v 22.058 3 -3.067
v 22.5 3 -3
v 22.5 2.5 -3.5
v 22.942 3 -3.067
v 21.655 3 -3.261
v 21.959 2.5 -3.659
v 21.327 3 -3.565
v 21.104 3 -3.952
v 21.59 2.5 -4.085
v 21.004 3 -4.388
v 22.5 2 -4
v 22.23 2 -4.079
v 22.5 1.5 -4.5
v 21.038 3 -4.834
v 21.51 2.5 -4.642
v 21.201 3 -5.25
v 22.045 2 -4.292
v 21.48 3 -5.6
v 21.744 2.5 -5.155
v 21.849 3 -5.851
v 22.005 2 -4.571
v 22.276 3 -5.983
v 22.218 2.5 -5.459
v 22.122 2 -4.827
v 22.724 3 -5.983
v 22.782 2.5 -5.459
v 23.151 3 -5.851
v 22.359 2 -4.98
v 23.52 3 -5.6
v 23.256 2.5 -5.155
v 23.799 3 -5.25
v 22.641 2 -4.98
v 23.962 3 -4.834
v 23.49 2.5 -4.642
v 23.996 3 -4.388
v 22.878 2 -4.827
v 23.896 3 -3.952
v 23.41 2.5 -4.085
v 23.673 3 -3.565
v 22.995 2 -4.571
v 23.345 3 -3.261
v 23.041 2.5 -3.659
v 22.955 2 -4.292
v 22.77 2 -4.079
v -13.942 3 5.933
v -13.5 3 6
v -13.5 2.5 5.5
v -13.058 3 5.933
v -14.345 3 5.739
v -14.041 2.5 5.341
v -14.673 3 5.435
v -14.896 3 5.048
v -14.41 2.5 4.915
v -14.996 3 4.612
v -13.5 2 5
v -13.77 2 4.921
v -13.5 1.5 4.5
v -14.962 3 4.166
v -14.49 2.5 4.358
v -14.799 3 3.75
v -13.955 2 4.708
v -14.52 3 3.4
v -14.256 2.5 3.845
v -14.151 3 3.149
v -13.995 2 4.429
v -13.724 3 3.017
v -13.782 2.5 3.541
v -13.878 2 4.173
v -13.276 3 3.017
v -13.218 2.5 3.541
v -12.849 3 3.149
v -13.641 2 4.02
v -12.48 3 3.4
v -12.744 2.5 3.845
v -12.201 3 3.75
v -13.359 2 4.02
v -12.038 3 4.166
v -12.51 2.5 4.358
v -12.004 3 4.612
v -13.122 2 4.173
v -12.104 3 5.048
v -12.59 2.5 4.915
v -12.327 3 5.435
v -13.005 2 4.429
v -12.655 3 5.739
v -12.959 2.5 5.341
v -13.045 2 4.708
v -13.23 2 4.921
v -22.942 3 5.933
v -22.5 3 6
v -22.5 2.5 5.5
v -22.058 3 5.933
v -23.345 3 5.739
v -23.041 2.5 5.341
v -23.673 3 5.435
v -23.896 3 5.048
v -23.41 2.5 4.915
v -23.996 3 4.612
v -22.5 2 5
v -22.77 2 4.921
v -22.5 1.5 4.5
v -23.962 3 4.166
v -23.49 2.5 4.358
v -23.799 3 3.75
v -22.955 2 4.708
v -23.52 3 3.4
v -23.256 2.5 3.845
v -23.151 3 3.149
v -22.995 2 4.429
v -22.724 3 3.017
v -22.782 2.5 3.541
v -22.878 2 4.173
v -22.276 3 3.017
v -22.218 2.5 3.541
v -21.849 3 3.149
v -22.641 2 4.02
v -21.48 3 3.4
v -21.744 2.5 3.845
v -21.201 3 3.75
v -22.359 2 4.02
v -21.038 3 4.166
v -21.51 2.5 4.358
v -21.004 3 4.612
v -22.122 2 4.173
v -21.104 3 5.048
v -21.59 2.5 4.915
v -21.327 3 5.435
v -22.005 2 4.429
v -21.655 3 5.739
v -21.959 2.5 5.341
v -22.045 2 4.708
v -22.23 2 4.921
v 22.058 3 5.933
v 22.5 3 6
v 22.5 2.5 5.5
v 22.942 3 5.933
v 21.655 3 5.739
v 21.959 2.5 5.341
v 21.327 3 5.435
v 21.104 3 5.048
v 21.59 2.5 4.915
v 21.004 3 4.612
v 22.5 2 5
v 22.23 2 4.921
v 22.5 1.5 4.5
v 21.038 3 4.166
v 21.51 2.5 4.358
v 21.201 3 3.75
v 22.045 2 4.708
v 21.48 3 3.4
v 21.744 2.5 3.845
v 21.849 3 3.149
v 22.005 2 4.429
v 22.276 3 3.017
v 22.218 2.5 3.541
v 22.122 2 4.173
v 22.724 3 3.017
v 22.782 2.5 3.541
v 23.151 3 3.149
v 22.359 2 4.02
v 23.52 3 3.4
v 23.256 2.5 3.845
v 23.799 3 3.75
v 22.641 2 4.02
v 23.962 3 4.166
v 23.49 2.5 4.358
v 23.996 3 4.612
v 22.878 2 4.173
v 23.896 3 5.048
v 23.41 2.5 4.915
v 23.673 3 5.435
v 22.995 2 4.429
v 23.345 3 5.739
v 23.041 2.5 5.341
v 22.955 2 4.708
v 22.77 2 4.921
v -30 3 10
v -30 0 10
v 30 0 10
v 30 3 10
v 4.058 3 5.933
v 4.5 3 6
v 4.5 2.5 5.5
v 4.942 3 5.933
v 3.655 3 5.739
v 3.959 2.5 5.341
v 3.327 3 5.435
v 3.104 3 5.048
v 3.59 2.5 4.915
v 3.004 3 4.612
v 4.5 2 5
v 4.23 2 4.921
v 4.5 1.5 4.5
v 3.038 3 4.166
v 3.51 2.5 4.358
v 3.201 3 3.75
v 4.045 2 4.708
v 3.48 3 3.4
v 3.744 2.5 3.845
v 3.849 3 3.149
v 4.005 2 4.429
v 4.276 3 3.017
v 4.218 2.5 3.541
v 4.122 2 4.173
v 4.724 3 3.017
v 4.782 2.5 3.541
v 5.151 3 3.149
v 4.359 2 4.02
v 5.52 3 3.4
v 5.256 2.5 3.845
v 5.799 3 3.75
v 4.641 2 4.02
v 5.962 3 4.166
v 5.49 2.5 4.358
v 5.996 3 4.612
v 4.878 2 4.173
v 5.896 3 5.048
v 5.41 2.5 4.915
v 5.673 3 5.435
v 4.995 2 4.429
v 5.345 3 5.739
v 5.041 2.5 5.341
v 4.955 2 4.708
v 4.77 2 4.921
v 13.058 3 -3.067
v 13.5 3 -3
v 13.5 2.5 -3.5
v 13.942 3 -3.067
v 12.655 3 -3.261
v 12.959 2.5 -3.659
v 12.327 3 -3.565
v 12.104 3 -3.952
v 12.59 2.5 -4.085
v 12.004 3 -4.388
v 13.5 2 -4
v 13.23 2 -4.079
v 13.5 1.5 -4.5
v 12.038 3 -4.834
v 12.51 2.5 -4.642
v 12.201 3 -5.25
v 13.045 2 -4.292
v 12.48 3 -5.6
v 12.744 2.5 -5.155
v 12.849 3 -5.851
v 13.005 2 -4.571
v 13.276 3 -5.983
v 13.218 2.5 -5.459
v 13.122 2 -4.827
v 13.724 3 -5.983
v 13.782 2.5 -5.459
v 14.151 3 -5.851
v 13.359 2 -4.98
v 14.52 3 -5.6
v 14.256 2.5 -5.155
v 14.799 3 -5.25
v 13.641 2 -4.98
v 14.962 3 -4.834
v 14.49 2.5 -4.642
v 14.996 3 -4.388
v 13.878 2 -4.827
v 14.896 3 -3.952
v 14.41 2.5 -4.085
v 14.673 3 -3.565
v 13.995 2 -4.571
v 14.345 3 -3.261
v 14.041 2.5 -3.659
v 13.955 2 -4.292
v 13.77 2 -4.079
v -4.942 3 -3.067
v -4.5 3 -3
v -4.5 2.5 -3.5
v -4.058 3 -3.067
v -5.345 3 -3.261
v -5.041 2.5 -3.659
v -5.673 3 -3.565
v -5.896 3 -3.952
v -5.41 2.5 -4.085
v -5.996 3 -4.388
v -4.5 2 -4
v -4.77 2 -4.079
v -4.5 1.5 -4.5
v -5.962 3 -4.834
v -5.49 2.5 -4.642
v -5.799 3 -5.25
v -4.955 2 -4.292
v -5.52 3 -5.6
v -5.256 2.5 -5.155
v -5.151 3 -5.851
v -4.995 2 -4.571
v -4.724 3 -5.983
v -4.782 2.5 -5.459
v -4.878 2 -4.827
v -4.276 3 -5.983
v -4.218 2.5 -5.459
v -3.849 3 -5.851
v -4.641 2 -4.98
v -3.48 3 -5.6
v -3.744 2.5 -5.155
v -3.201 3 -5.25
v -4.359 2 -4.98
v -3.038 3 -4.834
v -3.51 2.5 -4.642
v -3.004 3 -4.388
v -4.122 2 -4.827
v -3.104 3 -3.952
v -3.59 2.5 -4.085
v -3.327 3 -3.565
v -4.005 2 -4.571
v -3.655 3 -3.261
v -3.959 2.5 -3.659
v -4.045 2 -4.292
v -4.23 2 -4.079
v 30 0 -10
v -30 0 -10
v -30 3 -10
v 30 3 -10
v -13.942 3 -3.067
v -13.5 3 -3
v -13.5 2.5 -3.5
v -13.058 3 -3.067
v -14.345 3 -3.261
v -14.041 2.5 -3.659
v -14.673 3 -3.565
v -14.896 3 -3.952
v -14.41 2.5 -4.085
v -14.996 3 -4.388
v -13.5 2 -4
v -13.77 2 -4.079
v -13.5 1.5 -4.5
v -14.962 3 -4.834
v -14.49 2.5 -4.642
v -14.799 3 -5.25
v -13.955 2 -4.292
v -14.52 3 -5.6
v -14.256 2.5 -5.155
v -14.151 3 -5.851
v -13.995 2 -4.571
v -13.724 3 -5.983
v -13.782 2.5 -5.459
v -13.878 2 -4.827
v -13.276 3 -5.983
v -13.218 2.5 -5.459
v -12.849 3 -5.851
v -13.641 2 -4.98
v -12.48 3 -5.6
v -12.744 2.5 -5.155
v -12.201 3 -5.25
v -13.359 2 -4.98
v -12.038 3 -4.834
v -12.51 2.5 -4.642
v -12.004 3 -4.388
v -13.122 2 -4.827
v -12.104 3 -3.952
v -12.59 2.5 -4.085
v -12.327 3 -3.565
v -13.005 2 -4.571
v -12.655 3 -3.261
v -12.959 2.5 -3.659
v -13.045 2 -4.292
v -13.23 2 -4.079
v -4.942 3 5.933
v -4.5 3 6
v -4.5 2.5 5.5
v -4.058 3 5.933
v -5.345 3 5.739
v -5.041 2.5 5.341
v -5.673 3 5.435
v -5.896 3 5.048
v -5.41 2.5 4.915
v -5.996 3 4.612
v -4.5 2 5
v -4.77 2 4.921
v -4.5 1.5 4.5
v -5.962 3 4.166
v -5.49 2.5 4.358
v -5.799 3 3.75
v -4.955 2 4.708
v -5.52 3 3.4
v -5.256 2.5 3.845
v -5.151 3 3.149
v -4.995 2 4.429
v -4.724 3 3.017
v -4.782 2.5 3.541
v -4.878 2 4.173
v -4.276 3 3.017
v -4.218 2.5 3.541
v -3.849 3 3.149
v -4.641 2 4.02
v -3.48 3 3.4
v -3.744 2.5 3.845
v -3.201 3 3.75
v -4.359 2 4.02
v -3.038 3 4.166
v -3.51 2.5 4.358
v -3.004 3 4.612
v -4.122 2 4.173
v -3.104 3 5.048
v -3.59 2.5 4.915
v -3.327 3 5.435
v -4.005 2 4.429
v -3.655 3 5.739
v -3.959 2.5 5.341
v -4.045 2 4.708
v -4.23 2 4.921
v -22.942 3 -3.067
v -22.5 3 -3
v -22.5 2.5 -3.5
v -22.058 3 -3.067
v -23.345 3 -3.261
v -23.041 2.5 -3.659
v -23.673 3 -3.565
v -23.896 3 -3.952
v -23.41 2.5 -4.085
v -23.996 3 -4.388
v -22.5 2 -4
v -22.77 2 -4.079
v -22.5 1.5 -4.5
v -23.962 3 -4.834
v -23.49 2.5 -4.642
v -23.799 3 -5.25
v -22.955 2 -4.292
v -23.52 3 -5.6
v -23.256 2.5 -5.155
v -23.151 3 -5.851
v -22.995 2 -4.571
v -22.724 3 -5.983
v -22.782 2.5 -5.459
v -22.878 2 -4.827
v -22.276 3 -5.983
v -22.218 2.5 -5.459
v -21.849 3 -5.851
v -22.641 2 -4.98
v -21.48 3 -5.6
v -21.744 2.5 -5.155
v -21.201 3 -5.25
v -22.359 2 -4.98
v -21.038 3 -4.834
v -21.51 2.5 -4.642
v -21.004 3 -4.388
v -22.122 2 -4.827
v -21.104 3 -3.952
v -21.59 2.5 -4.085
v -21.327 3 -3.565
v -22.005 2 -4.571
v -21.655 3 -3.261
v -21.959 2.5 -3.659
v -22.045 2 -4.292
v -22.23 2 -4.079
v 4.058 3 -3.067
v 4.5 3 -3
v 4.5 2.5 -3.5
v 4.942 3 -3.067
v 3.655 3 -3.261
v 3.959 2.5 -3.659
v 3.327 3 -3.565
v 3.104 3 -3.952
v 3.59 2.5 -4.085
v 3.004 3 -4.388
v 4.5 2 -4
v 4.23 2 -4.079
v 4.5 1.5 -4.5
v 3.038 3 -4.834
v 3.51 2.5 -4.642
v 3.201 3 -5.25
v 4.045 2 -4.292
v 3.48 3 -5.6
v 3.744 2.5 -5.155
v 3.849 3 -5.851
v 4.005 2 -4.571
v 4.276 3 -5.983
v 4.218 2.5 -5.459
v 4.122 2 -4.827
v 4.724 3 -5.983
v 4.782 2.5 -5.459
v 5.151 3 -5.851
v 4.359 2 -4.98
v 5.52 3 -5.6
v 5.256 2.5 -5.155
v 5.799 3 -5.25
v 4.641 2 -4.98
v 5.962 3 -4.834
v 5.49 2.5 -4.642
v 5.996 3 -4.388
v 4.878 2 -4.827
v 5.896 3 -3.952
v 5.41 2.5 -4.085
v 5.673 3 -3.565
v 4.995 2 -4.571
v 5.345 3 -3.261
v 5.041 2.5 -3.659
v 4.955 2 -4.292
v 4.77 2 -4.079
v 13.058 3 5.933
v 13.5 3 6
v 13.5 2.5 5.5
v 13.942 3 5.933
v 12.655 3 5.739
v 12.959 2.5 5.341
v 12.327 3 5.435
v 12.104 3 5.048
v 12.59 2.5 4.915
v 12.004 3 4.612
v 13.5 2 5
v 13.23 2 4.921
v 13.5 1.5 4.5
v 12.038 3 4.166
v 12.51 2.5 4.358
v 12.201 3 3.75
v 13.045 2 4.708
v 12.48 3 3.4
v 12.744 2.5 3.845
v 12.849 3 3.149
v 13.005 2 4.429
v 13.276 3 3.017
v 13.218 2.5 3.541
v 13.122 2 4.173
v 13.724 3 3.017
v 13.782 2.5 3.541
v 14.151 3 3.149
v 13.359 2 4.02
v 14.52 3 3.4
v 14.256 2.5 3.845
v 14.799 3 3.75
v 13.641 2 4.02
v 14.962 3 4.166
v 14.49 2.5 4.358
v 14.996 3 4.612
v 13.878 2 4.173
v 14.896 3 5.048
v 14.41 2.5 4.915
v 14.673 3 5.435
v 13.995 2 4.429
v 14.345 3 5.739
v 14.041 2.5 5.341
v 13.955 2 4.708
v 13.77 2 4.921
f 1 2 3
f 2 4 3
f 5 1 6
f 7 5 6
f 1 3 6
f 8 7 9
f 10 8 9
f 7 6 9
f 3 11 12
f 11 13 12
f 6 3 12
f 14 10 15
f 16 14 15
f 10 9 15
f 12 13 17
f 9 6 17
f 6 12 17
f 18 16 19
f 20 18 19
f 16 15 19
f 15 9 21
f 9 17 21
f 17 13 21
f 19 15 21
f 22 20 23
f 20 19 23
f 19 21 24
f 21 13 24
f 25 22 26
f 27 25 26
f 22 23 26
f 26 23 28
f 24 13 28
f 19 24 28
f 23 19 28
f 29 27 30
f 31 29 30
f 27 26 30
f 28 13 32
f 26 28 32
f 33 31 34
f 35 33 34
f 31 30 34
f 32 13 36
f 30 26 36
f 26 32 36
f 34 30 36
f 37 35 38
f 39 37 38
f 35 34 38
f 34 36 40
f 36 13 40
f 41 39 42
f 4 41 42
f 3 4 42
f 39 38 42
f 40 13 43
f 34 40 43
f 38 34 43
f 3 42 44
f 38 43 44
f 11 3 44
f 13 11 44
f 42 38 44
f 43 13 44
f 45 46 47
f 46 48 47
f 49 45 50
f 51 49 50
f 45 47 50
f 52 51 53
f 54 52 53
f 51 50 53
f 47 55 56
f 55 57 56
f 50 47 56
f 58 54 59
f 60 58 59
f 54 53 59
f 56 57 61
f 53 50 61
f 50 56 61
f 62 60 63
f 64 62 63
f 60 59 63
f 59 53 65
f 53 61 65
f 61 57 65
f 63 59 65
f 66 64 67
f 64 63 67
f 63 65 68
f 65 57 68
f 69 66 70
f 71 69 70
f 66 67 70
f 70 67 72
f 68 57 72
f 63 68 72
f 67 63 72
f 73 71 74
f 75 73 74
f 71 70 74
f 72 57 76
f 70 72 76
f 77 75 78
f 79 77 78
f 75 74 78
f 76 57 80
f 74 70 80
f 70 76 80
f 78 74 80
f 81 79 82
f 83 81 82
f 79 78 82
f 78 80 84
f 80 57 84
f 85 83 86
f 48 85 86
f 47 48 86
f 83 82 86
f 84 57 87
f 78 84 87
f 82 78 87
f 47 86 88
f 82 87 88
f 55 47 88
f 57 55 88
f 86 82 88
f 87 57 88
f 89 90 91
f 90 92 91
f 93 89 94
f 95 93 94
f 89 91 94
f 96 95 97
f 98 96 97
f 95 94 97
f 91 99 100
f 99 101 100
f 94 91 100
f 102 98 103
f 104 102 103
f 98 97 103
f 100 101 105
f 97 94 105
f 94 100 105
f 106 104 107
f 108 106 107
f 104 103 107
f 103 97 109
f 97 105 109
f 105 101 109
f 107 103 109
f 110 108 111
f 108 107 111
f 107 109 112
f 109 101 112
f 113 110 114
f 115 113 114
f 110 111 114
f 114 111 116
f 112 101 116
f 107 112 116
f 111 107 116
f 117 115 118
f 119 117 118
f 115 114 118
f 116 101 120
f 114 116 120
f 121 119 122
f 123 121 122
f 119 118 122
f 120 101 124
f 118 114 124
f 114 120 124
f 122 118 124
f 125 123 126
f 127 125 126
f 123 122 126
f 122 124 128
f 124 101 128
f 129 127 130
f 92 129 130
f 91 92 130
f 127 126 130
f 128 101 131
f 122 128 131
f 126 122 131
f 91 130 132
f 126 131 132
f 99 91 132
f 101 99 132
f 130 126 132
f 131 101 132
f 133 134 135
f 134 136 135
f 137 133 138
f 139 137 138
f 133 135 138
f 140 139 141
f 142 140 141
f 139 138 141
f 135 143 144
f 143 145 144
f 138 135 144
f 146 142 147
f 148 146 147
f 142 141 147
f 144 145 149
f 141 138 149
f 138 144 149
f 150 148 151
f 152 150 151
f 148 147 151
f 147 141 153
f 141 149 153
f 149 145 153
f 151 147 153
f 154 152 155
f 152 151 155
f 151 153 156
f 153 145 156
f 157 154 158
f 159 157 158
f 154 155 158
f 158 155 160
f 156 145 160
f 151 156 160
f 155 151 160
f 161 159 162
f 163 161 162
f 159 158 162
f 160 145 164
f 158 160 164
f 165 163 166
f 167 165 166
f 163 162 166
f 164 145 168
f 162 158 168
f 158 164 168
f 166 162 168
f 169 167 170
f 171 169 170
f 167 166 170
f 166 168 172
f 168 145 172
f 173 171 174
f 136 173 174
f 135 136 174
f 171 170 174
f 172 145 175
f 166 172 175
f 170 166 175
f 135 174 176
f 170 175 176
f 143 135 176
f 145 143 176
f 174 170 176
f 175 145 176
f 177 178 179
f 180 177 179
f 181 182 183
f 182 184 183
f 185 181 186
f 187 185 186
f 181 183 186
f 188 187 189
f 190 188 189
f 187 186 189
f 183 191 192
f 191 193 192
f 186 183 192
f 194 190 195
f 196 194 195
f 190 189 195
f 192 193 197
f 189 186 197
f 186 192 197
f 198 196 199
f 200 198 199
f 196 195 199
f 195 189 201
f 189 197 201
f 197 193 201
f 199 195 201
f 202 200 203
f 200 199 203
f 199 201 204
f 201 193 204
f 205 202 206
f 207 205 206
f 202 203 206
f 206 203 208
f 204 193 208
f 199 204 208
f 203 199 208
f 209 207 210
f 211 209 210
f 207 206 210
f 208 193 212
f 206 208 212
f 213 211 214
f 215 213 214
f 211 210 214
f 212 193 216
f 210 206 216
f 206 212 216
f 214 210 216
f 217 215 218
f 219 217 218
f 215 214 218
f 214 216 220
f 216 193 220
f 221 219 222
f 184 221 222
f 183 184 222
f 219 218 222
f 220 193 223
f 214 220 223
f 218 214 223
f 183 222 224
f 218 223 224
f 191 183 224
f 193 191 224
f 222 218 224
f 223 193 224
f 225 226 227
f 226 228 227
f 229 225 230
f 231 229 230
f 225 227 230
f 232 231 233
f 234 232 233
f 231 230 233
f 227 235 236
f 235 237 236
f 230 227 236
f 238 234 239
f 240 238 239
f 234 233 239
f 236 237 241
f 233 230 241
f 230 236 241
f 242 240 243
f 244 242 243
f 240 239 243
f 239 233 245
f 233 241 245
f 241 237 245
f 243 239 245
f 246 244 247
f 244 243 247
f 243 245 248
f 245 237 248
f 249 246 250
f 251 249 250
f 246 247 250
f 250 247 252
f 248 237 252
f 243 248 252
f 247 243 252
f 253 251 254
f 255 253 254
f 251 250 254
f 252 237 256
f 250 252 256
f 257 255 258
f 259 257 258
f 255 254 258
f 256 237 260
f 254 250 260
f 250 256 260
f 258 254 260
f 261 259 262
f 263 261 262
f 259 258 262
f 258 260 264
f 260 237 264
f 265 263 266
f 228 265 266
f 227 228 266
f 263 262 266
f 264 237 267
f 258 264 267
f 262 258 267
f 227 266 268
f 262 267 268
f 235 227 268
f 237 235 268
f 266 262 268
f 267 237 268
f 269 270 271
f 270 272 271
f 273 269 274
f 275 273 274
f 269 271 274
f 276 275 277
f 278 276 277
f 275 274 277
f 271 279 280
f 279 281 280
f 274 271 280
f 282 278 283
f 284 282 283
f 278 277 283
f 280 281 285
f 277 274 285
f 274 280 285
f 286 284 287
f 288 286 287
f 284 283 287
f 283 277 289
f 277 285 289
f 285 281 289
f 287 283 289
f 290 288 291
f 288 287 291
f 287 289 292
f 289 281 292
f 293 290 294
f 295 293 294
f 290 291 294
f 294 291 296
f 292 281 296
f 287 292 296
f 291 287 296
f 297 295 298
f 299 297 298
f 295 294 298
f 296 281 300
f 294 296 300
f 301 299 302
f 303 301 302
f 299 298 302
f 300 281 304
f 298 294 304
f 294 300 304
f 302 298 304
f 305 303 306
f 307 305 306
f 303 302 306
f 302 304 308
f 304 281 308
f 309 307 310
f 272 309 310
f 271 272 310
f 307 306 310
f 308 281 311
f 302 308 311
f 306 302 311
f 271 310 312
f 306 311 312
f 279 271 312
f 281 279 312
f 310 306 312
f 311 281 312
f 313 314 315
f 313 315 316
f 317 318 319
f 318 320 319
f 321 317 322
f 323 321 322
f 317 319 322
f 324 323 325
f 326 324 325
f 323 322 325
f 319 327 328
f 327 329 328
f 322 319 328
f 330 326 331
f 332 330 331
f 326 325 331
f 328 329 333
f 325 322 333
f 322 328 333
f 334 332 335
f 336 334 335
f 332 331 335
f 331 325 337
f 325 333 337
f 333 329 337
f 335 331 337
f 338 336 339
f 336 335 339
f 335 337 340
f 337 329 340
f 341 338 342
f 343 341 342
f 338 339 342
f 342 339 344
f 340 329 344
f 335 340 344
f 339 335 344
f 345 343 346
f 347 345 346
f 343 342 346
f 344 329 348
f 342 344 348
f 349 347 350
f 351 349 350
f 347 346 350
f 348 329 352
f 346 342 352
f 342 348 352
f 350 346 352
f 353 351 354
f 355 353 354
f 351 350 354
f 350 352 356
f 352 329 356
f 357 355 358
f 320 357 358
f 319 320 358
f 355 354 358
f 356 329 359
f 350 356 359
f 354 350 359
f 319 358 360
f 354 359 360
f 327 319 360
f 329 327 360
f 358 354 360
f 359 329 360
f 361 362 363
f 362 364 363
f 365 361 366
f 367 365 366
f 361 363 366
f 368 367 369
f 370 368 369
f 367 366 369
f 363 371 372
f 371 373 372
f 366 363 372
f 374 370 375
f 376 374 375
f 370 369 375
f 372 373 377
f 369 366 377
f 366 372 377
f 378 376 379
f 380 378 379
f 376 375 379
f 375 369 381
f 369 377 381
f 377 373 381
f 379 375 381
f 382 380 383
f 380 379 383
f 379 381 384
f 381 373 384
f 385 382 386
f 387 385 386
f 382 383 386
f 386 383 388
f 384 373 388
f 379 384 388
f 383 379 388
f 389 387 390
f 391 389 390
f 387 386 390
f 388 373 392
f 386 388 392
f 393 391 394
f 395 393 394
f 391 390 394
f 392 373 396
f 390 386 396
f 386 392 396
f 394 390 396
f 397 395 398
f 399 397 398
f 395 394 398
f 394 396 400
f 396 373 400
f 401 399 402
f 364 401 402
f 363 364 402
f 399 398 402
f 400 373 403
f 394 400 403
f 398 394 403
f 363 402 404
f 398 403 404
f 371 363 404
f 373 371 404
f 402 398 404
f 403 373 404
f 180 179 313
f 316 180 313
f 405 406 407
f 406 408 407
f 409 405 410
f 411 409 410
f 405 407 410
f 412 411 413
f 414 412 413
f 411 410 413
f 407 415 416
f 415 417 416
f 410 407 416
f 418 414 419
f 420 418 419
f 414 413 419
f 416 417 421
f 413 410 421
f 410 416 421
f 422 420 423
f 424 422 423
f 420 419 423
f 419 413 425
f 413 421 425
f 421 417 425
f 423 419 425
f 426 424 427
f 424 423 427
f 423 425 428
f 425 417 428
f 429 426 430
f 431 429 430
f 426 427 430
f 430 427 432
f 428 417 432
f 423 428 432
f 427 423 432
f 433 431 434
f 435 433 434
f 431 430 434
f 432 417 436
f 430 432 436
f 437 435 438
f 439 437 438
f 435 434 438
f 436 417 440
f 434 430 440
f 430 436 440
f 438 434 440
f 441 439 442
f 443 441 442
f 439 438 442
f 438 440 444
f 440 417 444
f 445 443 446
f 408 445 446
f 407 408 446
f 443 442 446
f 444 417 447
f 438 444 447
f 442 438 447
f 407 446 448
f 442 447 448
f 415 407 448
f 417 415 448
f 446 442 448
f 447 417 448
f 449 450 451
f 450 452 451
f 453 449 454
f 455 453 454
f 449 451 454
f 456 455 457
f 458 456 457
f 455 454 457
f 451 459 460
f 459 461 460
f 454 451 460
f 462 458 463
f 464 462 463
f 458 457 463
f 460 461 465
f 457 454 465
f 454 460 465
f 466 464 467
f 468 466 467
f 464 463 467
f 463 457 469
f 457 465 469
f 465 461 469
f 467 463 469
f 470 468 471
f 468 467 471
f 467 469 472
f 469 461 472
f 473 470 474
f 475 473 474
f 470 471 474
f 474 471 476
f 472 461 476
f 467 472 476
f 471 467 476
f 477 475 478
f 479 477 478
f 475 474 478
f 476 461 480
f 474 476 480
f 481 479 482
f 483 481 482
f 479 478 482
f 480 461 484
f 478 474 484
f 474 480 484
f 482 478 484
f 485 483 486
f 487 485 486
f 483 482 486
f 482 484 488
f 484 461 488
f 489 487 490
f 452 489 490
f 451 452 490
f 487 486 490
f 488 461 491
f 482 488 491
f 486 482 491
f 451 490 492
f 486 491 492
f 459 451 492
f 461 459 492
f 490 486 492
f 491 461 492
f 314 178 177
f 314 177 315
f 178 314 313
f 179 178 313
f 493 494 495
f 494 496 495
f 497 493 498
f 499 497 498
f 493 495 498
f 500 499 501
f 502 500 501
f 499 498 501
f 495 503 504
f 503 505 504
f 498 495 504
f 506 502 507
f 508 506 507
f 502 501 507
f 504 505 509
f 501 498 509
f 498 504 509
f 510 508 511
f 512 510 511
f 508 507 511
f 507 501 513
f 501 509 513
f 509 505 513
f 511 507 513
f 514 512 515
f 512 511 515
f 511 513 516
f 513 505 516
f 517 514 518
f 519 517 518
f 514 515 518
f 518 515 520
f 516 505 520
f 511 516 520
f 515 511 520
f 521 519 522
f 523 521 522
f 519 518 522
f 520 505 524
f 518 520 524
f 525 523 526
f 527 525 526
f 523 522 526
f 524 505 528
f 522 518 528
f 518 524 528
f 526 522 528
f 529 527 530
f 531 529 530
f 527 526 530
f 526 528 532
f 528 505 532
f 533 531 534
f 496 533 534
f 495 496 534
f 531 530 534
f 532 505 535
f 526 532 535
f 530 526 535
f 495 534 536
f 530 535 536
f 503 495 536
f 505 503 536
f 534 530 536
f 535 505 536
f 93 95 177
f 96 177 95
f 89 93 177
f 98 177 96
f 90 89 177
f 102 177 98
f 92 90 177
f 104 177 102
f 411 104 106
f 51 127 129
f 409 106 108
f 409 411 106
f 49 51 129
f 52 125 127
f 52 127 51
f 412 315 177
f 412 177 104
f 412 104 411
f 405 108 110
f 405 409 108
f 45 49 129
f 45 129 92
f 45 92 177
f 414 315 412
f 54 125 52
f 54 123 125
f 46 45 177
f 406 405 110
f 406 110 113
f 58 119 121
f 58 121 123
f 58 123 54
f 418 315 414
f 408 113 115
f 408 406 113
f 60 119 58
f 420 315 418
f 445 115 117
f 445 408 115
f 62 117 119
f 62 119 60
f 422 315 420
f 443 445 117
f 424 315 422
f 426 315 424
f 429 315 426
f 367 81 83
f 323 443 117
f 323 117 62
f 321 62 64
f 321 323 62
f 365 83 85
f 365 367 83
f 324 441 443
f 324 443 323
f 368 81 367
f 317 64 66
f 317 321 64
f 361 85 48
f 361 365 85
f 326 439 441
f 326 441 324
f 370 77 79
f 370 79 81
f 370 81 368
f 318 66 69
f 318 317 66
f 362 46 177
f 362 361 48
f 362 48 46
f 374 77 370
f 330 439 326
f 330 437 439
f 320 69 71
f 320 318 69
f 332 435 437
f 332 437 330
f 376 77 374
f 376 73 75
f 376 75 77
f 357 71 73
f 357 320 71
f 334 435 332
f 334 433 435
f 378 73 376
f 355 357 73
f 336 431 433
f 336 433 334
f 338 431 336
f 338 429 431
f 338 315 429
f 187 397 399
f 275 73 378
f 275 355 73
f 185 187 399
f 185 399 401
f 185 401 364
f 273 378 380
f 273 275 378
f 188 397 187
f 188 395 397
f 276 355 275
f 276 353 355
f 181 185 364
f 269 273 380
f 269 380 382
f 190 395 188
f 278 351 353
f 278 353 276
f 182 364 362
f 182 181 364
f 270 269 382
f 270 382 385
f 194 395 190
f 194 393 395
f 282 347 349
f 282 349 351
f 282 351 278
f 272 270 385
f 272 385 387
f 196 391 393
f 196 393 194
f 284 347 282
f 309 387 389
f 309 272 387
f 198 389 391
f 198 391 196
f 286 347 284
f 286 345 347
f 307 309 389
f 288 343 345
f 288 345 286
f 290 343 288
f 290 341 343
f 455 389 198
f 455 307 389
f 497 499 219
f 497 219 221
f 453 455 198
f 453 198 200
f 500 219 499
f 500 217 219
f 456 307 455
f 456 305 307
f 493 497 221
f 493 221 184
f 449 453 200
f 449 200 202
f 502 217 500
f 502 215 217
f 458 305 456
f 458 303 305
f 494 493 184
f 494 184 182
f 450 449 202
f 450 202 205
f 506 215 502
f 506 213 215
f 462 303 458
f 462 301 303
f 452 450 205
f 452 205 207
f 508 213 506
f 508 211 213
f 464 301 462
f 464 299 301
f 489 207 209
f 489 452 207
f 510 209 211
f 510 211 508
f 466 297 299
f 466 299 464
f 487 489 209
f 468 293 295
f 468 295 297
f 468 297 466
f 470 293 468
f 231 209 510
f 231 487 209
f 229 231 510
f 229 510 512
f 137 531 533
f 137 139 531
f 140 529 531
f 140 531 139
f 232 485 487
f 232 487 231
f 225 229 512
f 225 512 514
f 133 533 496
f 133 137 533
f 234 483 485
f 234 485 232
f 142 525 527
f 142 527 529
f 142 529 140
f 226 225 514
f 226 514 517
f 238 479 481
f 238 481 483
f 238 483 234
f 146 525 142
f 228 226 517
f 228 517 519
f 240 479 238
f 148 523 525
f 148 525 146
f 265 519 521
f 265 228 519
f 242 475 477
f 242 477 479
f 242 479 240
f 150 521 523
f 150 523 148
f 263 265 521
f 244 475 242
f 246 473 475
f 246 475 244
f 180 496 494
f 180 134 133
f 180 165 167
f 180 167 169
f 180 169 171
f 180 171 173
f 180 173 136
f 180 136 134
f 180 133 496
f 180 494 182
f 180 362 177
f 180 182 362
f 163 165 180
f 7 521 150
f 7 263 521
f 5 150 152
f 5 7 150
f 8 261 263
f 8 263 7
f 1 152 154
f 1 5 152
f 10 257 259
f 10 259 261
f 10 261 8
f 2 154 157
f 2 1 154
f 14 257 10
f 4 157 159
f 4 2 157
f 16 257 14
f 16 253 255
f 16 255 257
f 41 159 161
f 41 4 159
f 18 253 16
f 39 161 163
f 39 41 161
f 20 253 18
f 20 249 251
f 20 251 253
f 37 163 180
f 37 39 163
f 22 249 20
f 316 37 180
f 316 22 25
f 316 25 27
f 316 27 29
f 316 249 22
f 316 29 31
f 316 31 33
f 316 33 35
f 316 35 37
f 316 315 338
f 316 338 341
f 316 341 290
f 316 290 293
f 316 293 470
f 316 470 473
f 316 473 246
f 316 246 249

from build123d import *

# Parameters (mm, degrees)
SKETCH1_W            = 60
SKETCH1_H            = 20
BOSS_EXTRUDE1_DEPTH  = 3
LPATTERN1_COUNT      = 6
LPATTERN1_PITCH      = 9
LPATTERN1_COUNT_DIR2 = 2
LPATTERN1_PITCH_DIR2 = 9


with BuildPart() as part:
    # Sketch1 → Boss-Extrude1 (new body)
    with BuildSketch(Plane(origin=(0, 0, 0), x_dir=(1, 0, 0), z_dir=(0, 1, 0))):
        Rectangle(SKETCH1_W, SKETCH1_H)
    extrude(amount=BOSS_EXTRUDE1_DEPTH)

    # Cut-Extrude1 cone 1 section (through the dimple's axis) → Cut-Extrude1 (revolve, cut)
    with BuildSketch(Plane(origin=(-22.5, 3, 4.5), x_dir=(0, 0, 1), z_dir=(1, 0, 0))):
        Polygon((0, 0), (1.5, 0), (0, 1.5), align=None)
    cut_extrude1 = revolve(axis=Axis((-22.5, 3, 4.5), (0, -1, 0)), mode=Mode.SUBTRACT)

    # LPattern1: Cut-Extrude1 6 × 2
    with Locations(*[(i * LPATTERN1_PITCH, 0, -j * LPATTERN1_PITCH_DIR2) for i in range(LPATTERN1_COUNT) for j in range(LPATTERN1_COUNT_DIR2) if (i, j) != (0, 0)]):
        add(cut_extrude1, mode=Mode.SUBTRACT)


solid = part.part
